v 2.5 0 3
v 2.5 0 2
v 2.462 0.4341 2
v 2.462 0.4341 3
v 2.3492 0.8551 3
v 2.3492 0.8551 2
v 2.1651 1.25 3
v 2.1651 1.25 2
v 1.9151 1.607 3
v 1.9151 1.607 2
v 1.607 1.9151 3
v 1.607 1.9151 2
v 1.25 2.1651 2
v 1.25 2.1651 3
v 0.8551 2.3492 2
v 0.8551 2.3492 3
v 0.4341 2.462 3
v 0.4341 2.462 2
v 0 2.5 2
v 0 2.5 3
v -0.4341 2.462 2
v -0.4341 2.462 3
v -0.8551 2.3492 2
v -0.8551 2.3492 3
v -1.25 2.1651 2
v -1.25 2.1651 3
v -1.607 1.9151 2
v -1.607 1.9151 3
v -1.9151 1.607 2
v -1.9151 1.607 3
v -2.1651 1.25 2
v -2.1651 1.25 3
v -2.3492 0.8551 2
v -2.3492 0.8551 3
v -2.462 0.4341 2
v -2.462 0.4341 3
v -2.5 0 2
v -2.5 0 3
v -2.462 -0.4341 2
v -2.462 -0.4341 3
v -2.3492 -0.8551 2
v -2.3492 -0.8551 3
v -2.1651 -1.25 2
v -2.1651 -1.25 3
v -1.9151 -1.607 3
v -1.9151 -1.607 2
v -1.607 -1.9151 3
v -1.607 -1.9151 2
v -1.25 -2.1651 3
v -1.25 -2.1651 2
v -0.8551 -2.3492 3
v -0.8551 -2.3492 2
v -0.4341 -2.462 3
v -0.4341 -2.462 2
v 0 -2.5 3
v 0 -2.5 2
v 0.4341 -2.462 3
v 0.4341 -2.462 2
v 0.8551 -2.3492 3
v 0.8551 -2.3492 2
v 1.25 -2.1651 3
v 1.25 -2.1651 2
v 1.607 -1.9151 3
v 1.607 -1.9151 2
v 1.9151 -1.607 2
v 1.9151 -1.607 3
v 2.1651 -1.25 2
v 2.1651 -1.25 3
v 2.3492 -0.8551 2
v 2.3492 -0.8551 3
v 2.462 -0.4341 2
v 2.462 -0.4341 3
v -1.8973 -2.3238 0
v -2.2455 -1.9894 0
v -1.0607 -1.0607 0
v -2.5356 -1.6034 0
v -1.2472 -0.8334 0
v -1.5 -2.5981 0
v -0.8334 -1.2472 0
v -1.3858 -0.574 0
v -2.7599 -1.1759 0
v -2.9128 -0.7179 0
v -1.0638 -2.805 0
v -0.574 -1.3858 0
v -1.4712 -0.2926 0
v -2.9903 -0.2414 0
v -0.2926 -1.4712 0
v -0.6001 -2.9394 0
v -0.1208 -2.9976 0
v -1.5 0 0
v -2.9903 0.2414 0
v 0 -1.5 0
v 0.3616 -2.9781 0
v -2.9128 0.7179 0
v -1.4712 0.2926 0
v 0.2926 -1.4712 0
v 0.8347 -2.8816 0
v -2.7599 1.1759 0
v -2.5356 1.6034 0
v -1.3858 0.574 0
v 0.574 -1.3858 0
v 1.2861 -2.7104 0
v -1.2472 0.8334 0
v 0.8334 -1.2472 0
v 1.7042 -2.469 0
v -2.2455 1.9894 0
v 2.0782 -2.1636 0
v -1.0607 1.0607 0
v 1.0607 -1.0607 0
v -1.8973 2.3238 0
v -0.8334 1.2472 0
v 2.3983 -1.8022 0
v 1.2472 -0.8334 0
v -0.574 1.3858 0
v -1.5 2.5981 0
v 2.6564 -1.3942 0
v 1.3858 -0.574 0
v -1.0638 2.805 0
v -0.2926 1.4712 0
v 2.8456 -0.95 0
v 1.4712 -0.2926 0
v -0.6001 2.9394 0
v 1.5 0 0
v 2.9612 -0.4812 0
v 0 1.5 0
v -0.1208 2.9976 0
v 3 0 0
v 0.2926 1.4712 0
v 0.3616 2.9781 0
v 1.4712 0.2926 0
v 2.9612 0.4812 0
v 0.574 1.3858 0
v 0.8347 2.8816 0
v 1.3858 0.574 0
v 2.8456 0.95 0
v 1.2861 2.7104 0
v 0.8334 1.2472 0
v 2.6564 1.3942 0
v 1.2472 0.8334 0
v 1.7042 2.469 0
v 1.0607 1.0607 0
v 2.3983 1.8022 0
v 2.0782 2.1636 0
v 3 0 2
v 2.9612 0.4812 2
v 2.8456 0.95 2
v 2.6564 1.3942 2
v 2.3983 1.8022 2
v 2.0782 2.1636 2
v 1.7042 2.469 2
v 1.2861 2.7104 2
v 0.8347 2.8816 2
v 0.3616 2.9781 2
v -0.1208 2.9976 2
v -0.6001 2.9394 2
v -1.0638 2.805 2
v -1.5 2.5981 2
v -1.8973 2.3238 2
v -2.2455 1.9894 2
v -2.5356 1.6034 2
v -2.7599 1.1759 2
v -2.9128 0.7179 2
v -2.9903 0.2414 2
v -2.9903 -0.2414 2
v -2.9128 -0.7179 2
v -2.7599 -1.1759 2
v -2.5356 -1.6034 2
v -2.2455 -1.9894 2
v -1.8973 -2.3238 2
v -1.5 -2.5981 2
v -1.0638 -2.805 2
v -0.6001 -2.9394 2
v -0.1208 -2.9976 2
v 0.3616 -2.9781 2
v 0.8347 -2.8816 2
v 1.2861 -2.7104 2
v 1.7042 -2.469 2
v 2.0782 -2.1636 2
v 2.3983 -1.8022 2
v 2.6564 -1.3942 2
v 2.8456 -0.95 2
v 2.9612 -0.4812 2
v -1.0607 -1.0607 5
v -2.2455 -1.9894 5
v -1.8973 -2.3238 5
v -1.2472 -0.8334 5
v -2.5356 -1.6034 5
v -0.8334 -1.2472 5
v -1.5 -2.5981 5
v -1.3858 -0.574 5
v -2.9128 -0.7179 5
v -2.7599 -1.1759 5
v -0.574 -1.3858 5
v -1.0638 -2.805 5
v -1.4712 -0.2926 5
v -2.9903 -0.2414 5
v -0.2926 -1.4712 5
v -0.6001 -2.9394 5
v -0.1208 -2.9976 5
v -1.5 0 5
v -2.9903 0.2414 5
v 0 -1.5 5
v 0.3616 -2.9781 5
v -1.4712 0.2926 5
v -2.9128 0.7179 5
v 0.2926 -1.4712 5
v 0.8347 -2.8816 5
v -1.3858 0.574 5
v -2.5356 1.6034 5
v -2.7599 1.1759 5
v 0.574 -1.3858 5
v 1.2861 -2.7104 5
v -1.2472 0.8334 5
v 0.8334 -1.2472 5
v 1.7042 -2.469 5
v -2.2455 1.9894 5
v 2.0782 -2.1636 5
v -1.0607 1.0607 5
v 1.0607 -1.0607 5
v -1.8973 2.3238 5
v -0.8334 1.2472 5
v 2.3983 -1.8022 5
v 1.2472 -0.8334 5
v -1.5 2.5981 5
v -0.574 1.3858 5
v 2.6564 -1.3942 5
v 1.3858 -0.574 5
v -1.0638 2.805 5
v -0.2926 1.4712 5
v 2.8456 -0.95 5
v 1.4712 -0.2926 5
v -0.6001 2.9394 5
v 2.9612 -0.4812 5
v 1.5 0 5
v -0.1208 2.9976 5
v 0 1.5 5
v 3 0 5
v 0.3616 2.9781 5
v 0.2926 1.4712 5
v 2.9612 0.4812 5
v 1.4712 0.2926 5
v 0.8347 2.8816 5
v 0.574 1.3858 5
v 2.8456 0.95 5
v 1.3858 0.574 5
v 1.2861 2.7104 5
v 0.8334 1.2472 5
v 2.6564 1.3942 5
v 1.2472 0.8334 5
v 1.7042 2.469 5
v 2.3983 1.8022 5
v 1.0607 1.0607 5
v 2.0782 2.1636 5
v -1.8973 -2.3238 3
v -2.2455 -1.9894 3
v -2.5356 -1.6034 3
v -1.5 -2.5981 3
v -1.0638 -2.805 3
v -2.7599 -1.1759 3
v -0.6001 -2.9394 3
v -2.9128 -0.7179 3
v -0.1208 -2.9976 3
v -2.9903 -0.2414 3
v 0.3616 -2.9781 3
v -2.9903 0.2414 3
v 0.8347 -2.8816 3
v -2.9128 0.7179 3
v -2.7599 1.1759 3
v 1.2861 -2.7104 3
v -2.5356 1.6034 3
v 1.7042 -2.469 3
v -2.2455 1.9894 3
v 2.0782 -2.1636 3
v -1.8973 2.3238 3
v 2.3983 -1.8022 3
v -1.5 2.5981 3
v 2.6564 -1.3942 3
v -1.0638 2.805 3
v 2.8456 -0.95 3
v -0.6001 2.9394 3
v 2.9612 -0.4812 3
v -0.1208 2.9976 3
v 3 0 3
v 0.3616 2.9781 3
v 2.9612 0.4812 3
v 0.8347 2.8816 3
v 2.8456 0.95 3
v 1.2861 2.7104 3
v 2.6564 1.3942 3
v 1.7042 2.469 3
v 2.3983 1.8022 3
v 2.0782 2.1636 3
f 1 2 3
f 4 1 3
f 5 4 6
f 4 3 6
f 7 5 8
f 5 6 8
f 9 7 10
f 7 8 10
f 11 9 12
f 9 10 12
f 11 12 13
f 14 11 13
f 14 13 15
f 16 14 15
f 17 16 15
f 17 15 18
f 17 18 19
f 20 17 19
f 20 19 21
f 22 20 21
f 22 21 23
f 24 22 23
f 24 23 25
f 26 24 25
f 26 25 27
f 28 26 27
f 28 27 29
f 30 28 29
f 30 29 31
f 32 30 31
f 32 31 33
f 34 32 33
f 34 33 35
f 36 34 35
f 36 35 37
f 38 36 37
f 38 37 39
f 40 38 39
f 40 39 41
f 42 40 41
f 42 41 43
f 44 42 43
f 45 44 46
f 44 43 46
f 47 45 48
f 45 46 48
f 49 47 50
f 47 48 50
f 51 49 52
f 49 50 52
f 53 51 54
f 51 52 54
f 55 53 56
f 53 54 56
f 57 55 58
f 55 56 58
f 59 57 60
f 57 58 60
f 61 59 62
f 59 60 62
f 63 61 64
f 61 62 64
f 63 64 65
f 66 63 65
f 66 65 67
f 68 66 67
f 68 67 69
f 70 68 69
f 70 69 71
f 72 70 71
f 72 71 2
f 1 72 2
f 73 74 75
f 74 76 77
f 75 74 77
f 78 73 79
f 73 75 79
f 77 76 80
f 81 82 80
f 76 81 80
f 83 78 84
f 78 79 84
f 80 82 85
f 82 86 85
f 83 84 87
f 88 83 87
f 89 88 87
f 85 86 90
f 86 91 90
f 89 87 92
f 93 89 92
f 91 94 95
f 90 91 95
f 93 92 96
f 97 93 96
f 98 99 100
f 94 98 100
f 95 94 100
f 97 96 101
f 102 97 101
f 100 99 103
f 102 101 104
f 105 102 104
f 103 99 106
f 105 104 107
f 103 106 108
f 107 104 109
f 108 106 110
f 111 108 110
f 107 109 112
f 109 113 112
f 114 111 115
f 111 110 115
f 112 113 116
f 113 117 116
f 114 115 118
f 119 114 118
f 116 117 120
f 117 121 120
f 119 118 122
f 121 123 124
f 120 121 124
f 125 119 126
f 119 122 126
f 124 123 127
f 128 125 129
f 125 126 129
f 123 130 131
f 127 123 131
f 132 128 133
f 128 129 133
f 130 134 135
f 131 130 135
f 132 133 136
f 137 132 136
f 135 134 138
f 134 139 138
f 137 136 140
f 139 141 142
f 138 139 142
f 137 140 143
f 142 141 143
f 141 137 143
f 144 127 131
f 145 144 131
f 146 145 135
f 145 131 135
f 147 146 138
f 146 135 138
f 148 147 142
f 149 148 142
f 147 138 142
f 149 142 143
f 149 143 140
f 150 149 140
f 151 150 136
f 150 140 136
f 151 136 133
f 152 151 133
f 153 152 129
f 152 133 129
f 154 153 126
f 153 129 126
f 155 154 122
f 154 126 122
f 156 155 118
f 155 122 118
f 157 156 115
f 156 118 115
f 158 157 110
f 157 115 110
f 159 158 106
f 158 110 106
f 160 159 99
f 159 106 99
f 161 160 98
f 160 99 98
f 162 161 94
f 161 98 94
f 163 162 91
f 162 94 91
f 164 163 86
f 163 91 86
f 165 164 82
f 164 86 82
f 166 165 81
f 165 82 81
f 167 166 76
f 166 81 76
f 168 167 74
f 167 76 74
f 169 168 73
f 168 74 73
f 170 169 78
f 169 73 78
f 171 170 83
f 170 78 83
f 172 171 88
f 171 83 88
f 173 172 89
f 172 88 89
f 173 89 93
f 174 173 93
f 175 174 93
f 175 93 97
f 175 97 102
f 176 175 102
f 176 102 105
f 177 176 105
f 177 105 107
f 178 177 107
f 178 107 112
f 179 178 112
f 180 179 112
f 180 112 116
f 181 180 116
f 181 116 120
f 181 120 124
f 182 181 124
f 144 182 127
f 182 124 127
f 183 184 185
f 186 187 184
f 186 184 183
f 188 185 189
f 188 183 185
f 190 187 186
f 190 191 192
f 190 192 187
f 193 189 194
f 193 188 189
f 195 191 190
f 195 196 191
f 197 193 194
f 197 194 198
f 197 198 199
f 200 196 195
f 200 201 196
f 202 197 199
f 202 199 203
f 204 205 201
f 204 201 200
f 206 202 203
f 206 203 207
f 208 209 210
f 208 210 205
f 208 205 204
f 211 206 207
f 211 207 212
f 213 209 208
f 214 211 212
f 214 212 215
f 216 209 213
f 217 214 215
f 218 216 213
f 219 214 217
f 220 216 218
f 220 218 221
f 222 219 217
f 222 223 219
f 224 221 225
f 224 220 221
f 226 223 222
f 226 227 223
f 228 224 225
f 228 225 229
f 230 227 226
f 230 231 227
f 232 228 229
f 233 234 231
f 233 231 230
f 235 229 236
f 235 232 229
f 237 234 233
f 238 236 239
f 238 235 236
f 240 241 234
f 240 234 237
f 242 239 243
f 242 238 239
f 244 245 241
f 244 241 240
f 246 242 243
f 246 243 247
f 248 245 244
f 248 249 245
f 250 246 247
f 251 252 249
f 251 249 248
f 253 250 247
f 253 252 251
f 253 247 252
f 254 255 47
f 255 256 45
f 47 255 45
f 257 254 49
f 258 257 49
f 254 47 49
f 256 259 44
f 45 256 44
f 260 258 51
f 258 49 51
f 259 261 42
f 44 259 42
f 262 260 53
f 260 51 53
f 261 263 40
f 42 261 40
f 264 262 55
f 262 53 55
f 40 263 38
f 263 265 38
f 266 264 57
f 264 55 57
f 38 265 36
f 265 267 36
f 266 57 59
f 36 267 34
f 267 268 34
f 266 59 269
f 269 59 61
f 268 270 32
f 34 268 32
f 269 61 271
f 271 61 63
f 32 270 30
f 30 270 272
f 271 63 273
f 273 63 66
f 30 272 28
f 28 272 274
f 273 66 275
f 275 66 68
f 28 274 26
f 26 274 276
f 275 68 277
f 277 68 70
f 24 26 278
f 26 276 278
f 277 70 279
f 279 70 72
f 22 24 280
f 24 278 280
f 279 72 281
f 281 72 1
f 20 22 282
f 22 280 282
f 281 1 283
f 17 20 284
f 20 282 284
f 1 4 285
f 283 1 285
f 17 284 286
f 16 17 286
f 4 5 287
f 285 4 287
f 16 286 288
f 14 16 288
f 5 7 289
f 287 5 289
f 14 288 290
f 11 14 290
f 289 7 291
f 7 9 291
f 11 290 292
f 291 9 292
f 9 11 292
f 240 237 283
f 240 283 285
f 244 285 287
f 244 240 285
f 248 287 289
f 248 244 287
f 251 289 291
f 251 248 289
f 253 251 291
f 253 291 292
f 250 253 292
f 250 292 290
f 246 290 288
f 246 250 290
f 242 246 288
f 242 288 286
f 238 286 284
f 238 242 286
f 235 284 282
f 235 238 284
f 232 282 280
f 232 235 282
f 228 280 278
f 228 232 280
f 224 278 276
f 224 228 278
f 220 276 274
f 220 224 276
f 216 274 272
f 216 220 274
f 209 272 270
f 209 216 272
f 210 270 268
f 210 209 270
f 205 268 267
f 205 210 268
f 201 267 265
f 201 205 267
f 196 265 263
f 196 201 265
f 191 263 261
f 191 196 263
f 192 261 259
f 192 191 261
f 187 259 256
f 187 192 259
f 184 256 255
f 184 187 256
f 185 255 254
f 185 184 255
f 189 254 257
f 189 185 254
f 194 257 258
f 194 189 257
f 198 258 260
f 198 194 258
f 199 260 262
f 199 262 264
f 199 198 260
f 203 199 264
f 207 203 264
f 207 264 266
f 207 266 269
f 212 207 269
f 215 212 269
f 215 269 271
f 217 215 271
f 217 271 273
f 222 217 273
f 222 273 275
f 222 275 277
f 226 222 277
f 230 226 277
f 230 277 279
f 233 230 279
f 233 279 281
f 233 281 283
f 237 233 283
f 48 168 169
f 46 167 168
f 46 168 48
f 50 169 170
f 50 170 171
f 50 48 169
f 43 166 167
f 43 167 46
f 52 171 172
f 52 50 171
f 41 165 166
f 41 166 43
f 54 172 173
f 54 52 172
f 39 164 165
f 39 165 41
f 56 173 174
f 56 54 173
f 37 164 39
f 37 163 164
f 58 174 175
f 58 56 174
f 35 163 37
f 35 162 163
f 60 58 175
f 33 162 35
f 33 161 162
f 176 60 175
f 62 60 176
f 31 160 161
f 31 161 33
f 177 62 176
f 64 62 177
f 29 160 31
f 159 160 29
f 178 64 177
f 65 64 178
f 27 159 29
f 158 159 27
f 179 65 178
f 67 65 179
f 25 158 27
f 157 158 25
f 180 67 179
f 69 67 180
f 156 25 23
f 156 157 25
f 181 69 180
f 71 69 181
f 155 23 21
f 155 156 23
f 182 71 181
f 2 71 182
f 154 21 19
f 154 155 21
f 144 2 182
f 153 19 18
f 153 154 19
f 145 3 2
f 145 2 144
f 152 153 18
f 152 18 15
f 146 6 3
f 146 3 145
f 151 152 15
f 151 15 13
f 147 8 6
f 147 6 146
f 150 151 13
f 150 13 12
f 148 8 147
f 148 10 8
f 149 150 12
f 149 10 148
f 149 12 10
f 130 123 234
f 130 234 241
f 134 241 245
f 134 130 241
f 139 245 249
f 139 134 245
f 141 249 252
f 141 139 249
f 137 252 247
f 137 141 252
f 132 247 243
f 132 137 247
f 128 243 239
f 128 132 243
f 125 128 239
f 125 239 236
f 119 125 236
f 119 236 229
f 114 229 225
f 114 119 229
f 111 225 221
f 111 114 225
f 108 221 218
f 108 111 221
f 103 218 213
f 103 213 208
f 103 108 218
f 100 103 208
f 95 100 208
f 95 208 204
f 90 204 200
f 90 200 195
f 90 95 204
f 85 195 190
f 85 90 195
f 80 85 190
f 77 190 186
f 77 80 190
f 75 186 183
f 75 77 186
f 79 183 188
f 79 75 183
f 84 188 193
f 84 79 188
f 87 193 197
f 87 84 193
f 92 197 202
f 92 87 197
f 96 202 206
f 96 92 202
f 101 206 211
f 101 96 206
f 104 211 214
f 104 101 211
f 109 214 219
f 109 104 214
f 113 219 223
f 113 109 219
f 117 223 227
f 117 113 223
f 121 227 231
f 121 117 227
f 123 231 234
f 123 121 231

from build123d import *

# Parameters (mm, degrees)
F0_R     = 2.5
F0_R_2   = 1.5
F1_DEPTH = 5
F0_R_3   = 3
F2_DEPTH = 2
F3_R     = 3
F3_R_2   = 2.5
F4_DEPTH = 2


with BuildPart() as f1:
    # F0 (on Top) → F1 (new body)
    with BuildSketch(Plane.XY):
        Circle(F0_R)
        Circle(F0_R_2, mode=Mode.SUBTRACT)
    extrude(amount=F1_DEPTH)

    # F0 (on Top) → F2 (join)
    with BuildSketch(Plane.XY):
        Circle(F0_R_3)
        Circle(F0_R, mode=Mode.SUBTRACT)
    extrude(amount=F2_DEPTH)

    # F3 (on face) → F4 (join)
    with BuildSketch(Plane.XY.offset(5)):
        Circle(F3_R)
        Circle(F3_R_2, mode=Mode.SUBTRACT)
    extrude(amount=-F4_DEPTH)


solid = f1.part
